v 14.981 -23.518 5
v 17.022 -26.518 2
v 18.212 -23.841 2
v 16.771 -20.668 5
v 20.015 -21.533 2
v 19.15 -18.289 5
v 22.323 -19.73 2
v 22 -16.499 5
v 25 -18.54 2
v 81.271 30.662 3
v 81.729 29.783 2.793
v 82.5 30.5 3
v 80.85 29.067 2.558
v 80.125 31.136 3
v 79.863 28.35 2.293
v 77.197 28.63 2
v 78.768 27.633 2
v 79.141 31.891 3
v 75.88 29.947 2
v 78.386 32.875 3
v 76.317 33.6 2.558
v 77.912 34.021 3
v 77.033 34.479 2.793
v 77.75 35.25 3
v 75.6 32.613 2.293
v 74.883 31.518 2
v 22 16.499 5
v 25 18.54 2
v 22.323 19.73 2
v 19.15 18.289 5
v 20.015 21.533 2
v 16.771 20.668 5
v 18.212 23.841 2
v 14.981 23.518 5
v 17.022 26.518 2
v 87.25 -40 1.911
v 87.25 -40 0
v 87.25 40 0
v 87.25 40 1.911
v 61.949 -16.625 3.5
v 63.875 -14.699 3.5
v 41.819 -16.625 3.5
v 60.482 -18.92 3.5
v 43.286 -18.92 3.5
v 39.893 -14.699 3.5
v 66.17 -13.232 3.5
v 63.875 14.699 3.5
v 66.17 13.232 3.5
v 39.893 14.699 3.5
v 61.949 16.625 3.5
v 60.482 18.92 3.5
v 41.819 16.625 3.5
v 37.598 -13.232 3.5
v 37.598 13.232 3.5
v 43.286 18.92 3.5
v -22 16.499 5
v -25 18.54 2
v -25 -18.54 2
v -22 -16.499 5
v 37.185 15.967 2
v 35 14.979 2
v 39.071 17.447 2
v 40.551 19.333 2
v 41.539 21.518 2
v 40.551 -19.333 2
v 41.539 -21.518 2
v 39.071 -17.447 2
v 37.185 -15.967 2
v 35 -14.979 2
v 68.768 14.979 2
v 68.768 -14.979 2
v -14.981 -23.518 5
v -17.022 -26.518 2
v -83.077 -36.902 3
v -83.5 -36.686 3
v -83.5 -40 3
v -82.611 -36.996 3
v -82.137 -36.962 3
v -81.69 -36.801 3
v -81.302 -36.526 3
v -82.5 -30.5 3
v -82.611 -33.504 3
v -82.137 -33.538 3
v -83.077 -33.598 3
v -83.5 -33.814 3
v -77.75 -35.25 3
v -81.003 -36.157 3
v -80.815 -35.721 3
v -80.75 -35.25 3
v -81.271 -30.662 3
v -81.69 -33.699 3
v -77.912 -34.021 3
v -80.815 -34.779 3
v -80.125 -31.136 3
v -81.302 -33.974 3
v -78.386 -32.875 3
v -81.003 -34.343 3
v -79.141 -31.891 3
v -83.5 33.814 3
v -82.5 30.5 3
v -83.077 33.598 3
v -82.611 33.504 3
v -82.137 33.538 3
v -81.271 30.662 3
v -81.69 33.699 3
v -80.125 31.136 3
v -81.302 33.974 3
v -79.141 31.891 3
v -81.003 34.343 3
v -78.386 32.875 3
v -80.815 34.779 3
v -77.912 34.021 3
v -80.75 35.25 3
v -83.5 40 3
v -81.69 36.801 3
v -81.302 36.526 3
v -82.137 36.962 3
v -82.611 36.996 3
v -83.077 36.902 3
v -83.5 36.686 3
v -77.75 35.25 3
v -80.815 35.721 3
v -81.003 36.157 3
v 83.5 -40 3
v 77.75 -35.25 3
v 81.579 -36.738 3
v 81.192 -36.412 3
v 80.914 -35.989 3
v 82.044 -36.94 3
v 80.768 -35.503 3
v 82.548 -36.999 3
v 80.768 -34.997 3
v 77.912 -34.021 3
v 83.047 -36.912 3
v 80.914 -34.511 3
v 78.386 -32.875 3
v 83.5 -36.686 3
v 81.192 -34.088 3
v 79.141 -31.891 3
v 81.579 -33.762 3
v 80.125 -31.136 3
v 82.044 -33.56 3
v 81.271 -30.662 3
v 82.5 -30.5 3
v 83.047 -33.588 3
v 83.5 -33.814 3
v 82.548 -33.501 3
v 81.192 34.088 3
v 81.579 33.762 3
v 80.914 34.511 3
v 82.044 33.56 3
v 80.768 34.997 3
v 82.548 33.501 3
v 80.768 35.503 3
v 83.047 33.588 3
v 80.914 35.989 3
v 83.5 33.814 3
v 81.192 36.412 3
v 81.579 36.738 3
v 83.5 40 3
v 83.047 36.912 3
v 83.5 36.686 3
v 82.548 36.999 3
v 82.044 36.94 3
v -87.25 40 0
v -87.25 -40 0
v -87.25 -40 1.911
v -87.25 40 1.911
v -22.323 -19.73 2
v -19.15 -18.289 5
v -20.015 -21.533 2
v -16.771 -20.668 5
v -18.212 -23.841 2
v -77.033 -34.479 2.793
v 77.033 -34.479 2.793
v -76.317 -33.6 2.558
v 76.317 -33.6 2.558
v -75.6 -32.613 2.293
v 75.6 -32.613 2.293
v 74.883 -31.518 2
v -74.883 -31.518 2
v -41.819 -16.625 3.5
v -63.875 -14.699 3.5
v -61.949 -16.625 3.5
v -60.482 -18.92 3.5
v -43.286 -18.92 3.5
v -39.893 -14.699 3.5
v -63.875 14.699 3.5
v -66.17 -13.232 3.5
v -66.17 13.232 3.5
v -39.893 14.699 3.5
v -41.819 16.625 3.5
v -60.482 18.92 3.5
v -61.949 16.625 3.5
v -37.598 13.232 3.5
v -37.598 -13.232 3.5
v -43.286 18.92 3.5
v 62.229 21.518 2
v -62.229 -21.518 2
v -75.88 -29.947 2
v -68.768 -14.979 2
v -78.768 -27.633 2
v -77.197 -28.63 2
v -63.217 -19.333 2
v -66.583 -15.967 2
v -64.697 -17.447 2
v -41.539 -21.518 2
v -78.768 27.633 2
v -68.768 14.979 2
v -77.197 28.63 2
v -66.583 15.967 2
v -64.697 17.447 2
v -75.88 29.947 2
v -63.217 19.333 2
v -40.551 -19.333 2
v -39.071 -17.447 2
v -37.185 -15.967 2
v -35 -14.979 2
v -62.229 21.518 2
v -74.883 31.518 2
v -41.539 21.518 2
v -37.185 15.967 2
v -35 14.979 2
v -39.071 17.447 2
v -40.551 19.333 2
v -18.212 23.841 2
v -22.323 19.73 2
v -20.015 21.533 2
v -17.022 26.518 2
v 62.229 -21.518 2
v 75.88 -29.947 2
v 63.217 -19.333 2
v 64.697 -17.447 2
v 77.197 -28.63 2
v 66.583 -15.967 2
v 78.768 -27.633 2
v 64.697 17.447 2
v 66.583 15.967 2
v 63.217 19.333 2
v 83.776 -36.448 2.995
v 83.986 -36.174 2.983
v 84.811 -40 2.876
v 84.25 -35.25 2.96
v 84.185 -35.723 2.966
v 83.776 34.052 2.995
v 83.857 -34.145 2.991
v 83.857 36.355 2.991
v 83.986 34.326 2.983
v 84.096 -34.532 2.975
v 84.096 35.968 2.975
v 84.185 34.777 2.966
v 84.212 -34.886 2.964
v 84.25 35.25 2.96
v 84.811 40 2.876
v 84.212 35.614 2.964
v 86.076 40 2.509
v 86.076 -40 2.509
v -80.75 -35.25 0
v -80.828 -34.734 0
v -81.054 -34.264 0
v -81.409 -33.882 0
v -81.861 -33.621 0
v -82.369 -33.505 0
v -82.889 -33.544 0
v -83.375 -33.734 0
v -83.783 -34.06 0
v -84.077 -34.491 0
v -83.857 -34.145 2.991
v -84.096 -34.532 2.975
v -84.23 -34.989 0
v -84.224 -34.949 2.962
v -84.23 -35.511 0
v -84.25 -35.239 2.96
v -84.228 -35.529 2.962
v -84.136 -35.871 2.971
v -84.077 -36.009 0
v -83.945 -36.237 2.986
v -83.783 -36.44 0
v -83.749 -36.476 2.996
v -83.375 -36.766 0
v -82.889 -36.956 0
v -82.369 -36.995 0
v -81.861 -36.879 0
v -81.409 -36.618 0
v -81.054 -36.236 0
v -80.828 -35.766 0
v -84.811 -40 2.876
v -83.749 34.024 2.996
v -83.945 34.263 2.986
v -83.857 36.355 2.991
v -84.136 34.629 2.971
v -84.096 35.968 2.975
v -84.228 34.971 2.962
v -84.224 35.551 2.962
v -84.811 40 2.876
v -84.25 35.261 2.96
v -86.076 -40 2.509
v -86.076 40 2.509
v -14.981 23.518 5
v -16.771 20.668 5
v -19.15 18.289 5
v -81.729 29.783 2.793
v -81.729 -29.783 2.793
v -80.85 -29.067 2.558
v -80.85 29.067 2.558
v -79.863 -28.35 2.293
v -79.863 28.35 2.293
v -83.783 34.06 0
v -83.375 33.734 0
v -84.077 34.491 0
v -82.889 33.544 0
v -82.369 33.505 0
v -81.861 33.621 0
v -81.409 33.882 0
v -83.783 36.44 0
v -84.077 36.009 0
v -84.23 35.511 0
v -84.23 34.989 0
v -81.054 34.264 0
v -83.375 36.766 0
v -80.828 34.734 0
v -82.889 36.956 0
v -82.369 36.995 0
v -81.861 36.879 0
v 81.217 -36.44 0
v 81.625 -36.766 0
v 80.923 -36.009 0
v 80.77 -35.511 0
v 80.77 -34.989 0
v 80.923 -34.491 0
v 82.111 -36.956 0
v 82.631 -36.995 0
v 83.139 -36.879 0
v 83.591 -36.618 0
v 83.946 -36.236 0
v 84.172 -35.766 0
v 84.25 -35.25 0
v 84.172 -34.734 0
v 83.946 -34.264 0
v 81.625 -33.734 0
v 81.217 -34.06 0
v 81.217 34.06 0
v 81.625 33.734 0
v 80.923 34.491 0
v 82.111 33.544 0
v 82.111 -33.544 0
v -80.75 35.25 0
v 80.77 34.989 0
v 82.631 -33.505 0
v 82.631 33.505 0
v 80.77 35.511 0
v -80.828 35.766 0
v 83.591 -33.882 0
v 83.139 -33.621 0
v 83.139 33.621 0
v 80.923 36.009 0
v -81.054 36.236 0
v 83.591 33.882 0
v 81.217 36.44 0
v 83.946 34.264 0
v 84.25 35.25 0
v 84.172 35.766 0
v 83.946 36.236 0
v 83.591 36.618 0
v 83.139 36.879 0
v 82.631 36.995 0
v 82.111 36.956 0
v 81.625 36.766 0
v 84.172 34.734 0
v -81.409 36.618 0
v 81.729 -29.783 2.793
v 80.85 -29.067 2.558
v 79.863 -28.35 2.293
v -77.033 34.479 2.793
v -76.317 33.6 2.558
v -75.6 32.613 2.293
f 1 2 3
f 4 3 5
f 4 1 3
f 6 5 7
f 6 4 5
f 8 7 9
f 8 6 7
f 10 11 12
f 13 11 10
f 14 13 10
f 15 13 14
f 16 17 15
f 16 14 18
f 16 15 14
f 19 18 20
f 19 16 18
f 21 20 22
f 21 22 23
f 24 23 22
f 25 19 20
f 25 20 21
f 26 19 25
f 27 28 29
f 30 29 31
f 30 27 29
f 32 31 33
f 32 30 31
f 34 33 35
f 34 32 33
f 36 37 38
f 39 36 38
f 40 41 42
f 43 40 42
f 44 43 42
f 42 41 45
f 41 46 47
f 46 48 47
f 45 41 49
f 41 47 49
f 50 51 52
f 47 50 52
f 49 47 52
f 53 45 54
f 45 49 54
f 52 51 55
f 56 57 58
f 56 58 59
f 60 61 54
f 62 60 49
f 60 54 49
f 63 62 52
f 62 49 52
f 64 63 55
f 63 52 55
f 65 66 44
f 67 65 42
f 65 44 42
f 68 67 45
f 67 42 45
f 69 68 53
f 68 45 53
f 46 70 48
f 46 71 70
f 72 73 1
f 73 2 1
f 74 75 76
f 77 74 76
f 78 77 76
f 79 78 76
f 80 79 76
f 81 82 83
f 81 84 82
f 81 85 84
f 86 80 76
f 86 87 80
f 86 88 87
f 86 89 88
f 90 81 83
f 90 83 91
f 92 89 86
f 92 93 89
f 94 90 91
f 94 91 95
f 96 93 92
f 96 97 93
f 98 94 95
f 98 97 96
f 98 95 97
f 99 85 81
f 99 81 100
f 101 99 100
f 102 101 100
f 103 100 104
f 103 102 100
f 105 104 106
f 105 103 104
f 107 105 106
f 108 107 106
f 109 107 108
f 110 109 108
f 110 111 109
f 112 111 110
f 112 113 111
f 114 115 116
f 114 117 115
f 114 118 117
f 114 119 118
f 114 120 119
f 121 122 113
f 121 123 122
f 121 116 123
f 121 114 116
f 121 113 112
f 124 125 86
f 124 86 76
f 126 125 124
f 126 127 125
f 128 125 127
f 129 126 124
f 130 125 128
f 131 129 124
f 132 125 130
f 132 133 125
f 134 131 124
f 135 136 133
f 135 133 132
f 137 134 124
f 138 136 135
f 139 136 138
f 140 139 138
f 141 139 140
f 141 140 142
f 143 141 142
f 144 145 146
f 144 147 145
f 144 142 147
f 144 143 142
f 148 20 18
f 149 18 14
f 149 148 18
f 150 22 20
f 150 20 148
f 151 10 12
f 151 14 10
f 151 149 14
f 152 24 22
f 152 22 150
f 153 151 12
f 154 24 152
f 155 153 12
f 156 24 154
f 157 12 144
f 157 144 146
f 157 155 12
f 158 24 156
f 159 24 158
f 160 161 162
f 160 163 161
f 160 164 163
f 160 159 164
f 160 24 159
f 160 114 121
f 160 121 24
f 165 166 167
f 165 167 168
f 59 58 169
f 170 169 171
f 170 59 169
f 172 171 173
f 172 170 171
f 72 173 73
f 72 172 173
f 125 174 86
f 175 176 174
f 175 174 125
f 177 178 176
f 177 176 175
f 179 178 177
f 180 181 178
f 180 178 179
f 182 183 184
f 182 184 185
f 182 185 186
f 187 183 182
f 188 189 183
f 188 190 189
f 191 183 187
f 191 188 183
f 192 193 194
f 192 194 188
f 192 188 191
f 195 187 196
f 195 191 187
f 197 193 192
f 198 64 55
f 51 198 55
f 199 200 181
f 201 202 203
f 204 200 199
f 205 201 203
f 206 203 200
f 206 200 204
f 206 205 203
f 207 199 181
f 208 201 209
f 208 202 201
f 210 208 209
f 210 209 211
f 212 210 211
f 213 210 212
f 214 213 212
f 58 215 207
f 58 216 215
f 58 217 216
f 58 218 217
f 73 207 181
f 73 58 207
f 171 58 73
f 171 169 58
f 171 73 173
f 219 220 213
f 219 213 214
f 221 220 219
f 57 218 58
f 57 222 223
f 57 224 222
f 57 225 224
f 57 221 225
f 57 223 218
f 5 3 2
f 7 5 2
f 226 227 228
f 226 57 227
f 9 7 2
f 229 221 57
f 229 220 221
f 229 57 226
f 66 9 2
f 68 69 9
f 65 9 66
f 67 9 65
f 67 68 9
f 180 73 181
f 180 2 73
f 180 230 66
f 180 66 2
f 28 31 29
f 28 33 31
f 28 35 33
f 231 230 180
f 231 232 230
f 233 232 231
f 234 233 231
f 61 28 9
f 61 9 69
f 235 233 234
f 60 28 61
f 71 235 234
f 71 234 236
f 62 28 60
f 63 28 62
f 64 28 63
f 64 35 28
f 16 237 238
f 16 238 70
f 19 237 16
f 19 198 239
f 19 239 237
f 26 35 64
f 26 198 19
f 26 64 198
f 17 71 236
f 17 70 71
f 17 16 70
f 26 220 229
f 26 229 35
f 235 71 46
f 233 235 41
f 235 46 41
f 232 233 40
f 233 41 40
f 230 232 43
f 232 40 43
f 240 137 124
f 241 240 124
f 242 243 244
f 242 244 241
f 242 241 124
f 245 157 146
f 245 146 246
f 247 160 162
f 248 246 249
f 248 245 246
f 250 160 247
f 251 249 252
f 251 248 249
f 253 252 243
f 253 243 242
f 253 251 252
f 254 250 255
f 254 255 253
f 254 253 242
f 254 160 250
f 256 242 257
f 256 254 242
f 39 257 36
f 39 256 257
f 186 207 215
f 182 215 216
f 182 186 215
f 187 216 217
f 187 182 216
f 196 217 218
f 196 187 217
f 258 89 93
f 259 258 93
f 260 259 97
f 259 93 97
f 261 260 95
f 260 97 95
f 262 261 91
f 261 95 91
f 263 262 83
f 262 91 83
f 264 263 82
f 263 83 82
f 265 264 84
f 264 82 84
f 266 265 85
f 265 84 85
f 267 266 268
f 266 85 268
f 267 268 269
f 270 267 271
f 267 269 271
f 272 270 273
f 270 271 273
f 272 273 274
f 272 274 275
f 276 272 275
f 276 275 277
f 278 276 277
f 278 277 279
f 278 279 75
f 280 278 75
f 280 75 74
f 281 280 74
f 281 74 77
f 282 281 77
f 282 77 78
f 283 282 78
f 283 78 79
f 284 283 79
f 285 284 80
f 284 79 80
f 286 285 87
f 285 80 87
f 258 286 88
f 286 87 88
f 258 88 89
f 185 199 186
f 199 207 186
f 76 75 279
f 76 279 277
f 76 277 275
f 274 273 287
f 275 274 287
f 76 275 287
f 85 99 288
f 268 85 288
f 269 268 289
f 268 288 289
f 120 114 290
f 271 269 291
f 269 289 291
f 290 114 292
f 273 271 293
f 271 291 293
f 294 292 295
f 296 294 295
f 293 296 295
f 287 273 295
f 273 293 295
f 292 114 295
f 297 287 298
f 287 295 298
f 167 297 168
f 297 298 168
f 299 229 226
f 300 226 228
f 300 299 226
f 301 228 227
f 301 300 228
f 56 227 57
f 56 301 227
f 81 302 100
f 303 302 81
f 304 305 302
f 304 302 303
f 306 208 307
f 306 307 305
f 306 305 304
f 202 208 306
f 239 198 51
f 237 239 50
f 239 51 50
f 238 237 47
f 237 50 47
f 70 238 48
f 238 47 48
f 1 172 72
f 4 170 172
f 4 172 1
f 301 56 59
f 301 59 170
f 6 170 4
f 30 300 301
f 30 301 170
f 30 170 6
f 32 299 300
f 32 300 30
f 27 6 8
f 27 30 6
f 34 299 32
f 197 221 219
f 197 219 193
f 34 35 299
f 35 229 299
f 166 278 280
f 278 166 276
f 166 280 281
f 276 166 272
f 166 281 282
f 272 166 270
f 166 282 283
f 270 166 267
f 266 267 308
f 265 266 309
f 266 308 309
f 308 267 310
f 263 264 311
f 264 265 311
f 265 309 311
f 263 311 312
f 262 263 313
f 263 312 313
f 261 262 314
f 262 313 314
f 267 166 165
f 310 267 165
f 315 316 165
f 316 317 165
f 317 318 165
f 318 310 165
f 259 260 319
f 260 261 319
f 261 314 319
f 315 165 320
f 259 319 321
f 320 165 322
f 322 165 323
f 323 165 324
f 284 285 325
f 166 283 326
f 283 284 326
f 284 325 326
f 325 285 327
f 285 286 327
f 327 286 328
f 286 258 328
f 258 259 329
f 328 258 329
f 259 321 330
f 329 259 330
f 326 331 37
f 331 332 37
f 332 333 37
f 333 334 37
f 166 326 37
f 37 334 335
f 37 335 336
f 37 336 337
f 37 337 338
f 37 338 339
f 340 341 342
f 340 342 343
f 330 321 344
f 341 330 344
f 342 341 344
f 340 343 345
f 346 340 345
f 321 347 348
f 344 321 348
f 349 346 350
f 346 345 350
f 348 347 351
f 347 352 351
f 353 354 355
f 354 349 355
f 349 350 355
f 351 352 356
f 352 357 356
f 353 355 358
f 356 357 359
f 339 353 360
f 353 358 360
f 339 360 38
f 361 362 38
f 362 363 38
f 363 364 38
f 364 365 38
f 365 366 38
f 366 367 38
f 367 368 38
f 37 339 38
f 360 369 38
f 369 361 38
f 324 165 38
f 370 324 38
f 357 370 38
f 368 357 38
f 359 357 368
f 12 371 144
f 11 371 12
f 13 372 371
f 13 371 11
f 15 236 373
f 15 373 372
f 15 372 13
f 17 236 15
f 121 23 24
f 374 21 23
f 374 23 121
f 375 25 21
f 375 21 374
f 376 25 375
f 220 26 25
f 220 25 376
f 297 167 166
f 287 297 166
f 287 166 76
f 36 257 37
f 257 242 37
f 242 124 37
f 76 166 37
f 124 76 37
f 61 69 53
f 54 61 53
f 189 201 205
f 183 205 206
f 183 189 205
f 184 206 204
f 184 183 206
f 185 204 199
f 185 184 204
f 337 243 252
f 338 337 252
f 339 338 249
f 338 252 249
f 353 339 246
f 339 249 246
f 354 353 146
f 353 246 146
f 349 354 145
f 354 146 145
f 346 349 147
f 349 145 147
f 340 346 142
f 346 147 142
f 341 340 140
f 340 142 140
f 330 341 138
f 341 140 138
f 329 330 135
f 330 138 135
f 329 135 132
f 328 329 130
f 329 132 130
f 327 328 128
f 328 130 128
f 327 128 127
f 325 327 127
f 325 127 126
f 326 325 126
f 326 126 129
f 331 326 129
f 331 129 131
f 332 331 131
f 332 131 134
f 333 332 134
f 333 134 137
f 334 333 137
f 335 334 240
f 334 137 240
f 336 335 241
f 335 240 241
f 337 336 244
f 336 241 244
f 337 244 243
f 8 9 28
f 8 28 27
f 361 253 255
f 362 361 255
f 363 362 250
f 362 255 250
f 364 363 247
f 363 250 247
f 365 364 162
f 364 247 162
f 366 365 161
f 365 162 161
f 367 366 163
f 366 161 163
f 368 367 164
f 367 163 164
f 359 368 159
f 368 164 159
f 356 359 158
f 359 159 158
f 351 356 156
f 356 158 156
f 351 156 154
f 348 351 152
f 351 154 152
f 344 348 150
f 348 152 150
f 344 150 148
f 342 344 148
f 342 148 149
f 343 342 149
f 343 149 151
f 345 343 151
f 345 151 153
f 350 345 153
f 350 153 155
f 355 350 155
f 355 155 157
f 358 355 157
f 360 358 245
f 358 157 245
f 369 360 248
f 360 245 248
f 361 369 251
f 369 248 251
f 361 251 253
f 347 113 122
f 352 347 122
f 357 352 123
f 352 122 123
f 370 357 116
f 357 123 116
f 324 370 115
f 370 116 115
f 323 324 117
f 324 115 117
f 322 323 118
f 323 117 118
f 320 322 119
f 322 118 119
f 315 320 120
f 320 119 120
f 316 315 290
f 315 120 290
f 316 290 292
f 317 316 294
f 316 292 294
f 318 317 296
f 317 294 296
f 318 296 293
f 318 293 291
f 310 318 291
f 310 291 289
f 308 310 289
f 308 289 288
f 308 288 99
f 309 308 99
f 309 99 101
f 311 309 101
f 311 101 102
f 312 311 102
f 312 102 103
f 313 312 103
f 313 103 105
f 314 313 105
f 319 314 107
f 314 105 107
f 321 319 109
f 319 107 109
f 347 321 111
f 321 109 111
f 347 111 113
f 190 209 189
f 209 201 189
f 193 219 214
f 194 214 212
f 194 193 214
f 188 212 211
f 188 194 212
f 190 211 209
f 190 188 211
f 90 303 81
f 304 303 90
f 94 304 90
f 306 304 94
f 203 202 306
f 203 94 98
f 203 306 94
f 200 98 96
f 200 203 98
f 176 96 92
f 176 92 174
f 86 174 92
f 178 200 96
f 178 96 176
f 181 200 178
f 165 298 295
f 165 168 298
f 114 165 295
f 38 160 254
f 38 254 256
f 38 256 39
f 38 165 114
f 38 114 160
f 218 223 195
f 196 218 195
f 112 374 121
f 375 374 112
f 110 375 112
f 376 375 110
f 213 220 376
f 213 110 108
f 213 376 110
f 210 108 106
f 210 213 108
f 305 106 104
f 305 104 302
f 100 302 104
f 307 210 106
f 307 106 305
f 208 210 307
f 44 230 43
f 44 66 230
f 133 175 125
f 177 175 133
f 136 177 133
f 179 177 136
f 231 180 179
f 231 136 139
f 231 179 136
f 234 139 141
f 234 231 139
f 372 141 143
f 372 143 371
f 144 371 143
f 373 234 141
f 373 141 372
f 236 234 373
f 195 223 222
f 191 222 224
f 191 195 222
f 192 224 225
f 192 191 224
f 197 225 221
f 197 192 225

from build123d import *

# Parameters (mm, degrees)
SKETCH2_W           = 174.5
SKETCH2_H           = 80
BOSS_EXTRUDE1_DEPTH = 3
SKETCH3_R           = 1.75
CUT_EXTRUDE1_DEPTH  = 3
CUT_EXTRUDE2_DEPTH  = 1
CUT_EXTRUDE2_DRAFT  = -75
CUT_EXTRUDE3_REACH  = 120.413
BOSS_EXTRUDE2_DEPTH = 3
BOSS_EXTRUDE2_TAPER = 45
BOSS_EXTRUDE3_DEPTH = 1.5
BOSS_EXTRUDE3_TAPER = 60


# Read off the part's stored shape, not the designer's step: Cut-Extrude2
with BuildPart() as part:
    # Sketch2 → Boss-Extrude1 (new body)
    with BuildSketch(Plane.XY):
        Rectangle(SKETCH2_W, SKETCH2_H)
    extrude(amount=BOSS_EXTRUDE1_DEPTH)

    # Sketch3 → Cut-Extrude1 (cut)
    with BuildSketch(Plane.XY.offset(3)):
        with Locations((-82.5, 35.25)):
            Circle(SKETCH3_R)
        with Locations((82.5, 35.25)):
            Circle(SKETCH3_R)
        with Locations((82.5, -35.25)):
            Circle(SKETCH3_R)
        with Locations((-82.5, -35.25)):
            Circle(SKETCH3_R)
    extrude(amount=-CUT_EXTRUDE1_DEPTH, mode=Mode.SUBTRACT)


with BuildPart() as cut_extrude2_tool:
    # Cut-Extrude2 outline → Cut-Extrude2 (with draft: the straight prism first)
    with BuildSketch(Plane.XY.offset(2)):
        with BuildLine():
            ThreePointArc((-74.883112009, 31.517949192), (-76.502284356, 29.252284356), (-78.767949192, 27.633112009))
            Line((-78.767949192, 27.633112009), (-78.767949192, -27.633112009))
            ThreePointArc((-78.767949192, -27.633112009), (-76.502284356, -29.252284356), (-74.883112009, -31.517949192))
            Line((-74.883112009, -31.517949192), (74.883112009, -31.517949192))
            ThreePointArc((74.883112009, -31.517949192), (76.502284356, -29.252284356), (78.767949192, -27.633112009))
            Line((78.767949192, -27.633112009), (78.767949192, 27.633112009))
            ThreePointArc((78.767949192, 27.633112009), (76.502284356, 29.252284356), (74.883112009, 31.517949192))
            Line((74.883112009, 31.517949192), (-74.883112009, 31.517949192))
        make_face()
    extrude(amount=CUT_EXTRUDE2_DEPTH)
    # Cut-Extrude2: the draft: its side faces are tilted about the plane it starts from
    cut_extrude2_sides = [cut_extrude2_tool.faces().sort_by_distance(p)[0] for p in [
        (-76.502284356, 29.252284356, 2.5),
        (-78.767949192, 0, 2.5),
        (-76.502284356, -29.252284356, 2.5),
        (0, -31.517949192, 2.5),
        (76.502284356, -29.252284356, 2.5),
        (78.767949192, 0, 2.5),
        (76.502284356, 29.252284356, 2.5),
        (0, 31.517949192, 2.5),
    ]]
    draft(cut_extrude2_sides, Plane.XY.offset(2), CUT_EXTRUDE2_DRAFT)


with BuildPart() as part_1:
    add(part.part)

    # Cut-Extrude2: cut by cut_extrude2_tool
    add(cut_extrude2_tool.part, mode=Mode.SUBTRACT)

    # Sketch5 → Cut-Extrude3 (cut, up to next)
    with BuildSketch(Plane(origin=(0, 40, 0), x_dir=(1, 0, 0), z_dir=(0, 1, 0)), mode=Mode.PRIVATE) as cut_extrude3_sk1:
        with BuildLine():
            Line((-87.25, -1.910795209), (-87.25, -3))
            Line((-87.25, -3), (-83.5, -3))
            ThreePointArc((-83.5, -3), (-85.45248989, -2.722185897), (-87.25, -1.910795209))
        make_face()
    cut_extrude3_tool1 = extrude(cut_extrude3_sk1.sketch, amount=-CUT_EXTRUDE3_REACH, mode=Mode.PRIVATE) & part_1.part
    cut_extrude3 = cut_extrude3_tool1.solids().sort_by_distance((-86.327713, 40, 2.678112))[0]
    add(cut_extrude3, mode=Mode.SUBTRACT)

    # Mirror1: Cut-Extrude3 across plane
    add(cut_extrude3.mirror(Plane(origin=(0, 0, 0), x_dir=(0, 0, 1), z_dir=(1, 0, 0))), mode=Mode.SUBTRACT)

    # Sketch6 → Boss-Extrude2 (add)
    with BuildSketch(Plane.XY.offset(2)):
        with BuildLine():
            Line((-25, 18.539708909), (-25, -18.539708909))
            ThreePointArc((-25, -18.539708909), (-20.014718626, -21.532667818), (-17.021759717, -26.517949192))
            Line((-17.021759717, -26.517949192), (17.021759717, -26.517949192))
            ThreePointArc((17.021759717, -26.517949192), (20.014718626, -21.532667818), (25, -18.539708909))
            Line((25, -18.539708909), (25, 18.539708909))
            ThreePointArc((25, 18.539708909), (20.014718626, 21.532667818), (17.021759717, 26.517949192))
            Line((17.021759717, 26.517949192), (-17.021759717, 26.517949192))
            ThreePointArc((-17.021759717, 26.517949192), (-20.014718626, 21.532667818), (-25, 18.539708909))
        make_face()
    extrude(amount=BOSS_EXTRUDE2_DEPTH, taper=BOSS_EXTRUDE2_TAPER)

    # Sketch7 → Boss-Extrude3 (add)
    with BuildSketch(Plane.XY.offset(2)):
        with BuildLine():
            ThreePointArc((-68.767949192, -14.978557178), (-64.696881381, -17.446881381), (-62.228557178, -21.517949192))
            Line((-62.228557178, -21.517949192), (-41.539392014, -21.517949192))
            ThreePointArc((-41.539392014, -21.517949192), (-39.071067812, -17.446881381), (-35, -14.978557178))
            Line((-35, -14.978557178), (-35, 14.978557178))
            ThreePointArc((-35, 14.978557178), (-39.071067812, 17.446881381), (-41.539392014, 21.517949192))
            Line((-41.539392014, 21.517949192), (-62.228557178, 21.517949192))
            ThreePointArc((-62.228557178, 21.517949192), (-64.696881381, 17.446881381), (-68.767949192, 14.978557178))
            Line((-68.767949192, 14.978557178), (-68.767949192, -14.978557178))
        make_face()
    boss_extrude3 = extrude(amount=BOSS_EXTRUDE3_DEPTH, taper=BOSS_EXTRUDE3_TAPER)

    # Mirror2: Boss-Extrude3 across plane
    add(boss_extrude3.mirror(Plane(origin=(0, 0, 0), x_dir=(0, 0, 1), z_dir=(1, 0, 0))))


solid = part_1.part
